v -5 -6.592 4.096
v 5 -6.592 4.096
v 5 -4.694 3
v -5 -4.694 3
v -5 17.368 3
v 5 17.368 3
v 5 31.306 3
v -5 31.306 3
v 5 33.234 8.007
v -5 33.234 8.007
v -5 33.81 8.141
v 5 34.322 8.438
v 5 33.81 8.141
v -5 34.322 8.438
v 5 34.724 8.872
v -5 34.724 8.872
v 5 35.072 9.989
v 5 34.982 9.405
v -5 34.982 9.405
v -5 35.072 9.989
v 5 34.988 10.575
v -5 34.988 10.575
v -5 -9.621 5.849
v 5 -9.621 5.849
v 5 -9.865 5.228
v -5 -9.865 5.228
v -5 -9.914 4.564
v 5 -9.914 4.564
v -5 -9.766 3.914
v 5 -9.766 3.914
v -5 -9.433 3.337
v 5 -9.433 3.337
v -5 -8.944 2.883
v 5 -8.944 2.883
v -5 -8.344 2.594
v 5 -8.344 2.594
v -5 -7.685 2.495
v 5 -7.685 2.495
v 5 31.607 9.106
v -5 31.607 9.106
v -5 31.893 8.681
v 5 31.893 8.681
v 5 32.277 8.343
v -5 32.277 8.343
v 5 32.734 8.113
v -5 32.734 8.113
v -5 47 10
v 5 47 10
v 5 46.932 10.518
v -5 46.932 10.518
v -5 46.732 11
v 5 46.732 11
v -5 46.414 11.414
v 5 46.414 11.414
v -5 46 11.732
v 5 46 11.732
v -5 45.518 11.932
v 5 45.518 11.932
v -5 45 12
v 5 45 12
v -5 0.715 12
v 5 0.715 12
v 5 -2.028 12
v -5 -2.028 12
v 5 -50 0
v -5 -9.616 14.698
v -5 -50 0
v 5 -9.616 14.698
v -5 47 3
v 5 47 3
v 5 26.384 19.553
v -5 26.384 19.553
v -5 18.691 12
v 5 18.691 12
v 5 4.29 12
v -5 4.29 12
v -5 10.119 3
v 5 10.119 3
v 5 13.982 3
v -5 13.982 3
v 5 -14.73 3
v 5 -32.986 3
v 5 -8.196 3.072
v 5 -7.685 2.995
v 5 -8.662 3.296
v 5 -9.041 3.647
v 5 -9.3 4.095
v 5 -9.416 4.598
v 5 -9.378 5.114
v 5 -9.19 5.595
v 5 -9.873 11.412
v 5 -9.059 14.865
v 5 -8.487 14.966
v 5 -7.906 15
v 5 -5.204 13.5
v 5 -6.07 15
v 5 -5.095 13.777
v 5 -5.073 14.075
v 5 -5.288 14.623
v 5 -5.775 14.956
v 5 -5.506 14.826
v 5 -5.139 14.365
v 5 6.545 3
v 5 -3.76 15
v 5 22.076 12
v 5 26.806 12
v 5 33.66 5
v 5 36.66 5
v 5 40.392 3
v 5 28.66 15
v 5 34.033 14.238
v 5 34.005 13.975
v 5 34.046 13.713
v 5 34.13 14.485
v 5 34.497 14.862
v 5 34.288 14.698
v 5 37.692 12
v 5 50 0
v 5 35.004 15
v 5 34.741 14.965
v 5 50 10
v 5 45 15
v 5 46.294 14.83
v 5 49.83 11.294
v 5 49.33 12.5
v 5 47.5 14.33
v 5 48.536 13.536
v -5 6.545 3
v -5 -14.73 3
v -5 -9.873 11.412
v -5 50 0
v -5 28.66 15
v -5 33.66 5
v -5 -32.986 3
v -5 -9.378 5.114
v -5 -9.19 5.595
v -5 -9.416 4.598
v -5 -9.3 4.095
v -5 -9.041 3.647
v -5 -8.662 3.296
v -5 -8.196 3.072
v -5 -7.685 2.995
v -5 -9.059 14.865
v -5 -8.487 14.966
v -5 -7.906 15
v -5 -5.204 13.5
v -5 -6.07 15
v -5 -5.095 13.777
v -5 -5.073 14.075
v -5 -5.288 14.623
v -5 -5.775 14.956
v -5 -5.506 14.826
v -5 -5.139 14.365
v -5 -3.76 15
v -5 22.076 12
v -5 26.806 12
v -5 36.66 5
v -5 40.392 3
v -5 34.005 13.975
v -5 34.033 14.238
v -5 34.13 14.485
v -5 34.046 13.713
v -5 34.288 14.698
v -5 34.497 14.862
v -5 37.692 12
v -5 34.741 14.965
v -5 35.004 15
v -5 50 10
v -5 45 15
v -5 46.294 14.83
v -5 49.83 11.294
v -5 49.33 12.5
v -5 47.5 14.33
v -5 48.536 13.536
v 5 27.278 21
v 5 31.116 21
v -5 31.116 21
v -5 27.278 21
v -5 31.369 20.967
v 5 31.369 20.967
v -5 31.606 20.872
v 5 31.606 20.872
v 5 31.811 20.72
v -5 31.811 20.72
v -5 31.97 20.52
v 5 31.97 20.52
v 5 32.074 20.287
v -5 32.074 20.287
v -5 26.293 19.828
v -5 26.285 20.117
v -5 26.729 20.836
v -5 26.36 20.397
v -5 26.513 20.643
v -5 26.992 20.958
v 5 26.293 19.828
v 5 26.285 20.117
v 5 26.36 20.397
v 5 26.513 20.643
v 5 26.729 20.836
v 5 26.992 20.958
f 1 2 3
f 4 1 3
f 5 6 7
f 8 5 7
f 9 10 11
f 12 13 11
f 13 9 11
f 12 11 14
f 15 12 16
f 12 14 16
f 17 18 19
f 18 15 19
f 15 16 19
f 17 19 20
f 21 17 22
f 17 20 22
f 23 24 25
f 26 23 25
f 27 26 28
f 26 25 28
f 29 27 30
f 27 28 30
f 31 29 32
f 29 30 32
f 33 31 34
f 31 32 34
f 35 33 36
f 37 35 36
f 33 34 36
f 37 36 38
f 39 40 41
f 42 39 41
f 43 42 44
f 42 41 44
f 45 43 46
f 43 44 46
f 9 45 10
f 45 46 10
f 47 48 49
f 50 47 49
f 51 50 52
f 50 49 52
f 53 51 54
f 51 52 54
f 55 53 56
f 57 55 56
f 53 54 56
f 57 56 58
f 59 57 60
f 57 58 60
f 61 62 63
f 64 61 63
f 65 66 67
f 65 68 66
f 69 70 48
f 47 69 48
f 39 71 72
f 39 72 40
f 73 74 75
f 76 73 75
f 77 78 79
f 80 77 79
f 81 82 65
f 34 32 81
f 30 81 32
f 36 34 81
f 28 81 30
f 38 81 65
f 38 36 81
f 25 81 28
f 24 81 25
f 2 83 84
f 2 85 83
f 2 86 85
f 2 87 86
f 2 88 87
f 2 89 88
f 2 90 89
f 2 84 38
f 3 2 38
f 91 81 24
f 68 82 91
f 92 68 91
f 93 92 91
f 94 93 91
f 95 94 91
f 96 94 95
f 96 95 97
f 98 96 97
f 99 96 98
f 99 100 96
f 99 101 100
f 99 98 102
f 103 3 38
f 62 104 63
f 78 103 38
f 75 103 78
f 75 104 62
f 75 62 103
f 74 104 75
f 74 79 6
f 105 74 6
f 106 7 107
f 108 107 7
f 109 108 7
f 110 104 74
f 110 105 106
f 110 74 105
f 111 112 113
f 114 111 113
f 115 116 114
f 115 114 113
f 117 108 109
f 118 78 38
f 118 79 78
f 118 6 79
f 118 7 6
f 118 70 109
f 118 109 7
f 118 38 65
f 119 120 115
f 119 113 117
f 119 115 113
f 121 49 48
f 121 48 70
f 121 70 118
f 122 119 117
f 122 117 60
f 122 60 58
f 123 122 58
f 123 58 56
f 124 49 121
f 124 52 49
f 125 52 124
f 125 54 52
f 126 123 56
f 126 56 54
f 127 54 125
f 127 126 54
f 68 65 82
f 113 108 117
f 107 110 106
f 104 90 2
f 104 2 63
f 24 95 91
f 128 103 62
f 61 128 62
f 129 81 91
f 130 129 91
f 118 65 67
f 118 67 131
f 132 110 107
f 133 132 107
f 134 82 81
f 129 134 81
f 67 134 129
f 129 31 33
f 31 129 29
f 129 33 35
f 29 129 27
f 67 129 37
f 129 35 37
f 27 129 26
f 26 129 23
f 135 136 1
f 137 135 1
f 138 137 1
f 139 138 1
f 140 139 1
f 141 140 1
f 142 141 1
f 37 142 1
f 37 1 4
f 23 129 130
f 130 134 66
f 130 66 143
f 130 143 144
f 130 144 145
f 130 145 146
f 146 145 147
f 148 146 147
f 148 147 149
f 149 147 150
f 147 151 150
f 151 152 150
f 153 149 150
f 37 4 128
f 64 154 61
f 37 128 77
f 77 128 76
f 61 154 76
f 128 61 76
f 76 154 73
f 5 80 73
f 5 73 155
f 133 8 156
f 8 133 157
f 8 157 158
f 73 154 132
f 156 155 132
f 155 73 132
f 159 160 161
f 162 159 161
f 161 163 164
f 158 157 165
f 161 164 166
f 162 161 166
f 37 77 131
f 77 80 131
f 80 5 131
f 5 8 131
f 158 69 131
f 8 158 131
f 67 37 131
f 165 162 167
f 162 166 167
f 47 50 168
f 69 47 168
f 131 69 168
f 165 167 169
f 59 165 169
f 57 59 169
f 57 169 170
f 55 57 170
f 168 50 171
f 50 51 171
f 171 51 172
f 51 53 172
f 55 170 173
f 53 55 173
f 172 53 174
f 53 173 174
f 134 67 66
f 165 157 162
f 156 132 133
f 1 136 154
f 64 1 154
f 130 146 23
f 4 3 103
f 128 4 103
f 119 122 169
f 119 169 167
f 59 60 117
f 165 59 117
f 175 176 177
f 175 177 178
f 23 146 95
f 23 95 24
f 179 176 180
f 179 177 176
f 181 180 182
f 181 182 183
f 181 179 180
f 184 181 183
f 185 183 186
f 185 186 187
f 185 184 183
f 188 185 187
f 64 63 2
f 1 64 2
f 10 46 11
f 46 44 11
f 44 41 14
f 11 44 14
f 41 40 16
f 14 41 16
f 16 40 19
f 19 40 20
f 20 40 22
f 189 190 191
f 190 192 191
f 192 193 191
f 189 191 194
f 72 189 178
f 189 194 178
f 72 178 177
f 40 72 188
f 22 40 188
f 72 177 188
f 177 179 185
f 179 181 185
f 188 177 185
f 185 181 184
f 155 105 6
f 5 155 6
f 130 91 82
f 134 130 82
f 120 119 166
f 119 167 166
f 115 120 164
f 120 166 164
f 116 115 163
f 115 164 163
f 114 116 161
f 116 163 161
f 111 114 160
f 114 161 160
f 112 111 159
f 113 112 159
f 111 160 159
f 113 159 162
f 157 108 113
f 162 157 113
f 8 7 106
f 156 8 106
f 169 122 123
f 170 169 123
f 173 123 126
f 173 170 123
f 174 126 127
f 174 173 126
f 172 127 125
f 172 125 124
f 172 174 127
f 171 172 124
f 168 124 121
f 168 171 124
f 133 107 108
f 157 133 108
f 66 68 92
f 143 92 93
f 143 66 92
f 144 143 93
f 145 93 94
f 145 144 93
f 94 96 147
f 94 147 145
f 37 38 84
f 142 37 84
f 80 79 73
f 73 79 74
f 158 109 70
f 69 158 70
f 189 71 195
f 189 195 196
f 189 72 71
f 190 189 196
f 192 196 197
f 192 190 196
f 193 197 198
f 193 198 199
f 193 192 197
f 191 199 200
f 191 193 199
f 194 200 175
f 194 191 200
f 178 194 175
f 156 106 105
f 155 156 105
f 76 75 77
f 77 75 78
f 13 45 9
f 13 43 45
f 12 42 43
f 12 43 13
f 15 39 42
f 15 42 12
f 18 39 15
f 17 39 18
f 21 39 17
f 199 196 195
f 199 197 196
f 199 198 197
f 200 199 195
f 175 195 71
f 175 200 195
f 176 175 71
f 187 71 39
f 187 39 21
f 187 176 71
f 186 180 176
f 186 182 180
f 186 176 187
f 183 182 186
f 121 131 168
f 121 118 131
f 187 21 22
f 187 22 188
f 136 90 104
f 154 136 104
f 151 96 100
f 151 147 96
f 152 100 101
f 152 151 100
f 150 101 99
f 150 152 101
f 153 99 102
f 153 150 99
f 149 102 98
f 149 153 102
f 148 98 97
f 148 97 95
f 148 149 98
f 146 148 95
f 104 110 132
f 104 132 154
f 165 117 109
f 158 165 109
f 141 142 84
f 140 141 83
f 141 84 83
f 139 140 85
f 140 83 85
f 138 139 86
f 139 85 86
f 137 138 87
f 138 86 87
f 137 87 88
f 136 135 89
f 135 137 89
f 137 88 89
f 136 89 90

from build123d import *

# Parameters (mm, degrees)
F1_DEPTH     = 5
F2_R         = 5
F4_DEPTH     = 25
F6_DEPTH     = 10
F8_DEPTH     = 25
F9_R         = 1
F10_T1_DEPTH = 16.1803398875
F10_T3_DEPTH = 23.4403065089
F11_R        = 1


# Not quite as in the source:
# - a fillet or chamfer that OpenCascade refuses, or shapes differently, is made with other operations: its cross-section is extruded or revolved along the edge and cut away or added
# - ends of sketch curves that miss each other by under 0.0002 mm in the source are joined


with BuildPart() as f1:
    # F0 (on Right) → F1 (new body, symmetric)
    with BuildSketch(Plane.YZ):
        Polygon((-8.7878387082, 15), (-50, 0), (50, 0), (50, 15), align=None)
    extrude(amount=F1_DEPTH, both=True)

    # F2
    f2_edges = [f1.edges().sort_by_distance(p)[0] for p in [
        (0, 50, 15),
        (0, -8.787839, 15),
    ]]
    fillet(f2_edges, radius=F2_R)

    # F3 (on face) → F4 (cut)
    with BuildSketch(Plane.YZ.offset(5)):
        with BuildLine():
            Line((-3.7603476085, 15), (-4.3376978777, 15))
            Line((-4.3376978777, 15), (-9.6211402319, 5.8488094036))
            ThreePointArc((-9.6211402319, 5.8488094036), (-9.6211402319, 3.6128792242), (-7.6847678955, 2.4949141345))
            Line((-7.6847678955, 2.4949141345), (-7.6847678955, 2.9949141345))
            ThreePointArc((-7.6847678955, 2.9949141345), (-9.1871699303, 3.8612227218), (-9.190037249, 5.5954932374))
            Line((-9.190037249, 5.5954932374), (-3.7603476085, 15))
        make_face()
        Polygon((33.6602540378, 15), (28.6602540378, 15), (33.6602540378, 5), (36.6602540378, 5), align=None)
    extrude(amount=-F4_DEPTH, mode=Mode.SUBTRACT)

    # F7 (on face) → F8 (cut)
    with BuildSketch(Plane.YZ.offset(5)):
        Polygon((22.076485224, 12), (17.3679771944, 3), (31.3061520716, 3), (26.8061520716, 12), align=None)
        Polygon((4.2896619261, 12), (10.1192439169, 3), (13.9822219387, 3), (18.6907299683, 12), align=None)
        Polygon((-6.5919574173, 4.095507944), (-4.6944819983, 3), (6.5448904216, 3), (0.7153084307, 12), (-2.0282968009, 12), align=None)
        Polygon((-9.8730549791, 11.4124802622), (-32.9861545411, 3), (-14.7300027231, 3), align=None)
        with BuildLine():
            Line((45, 12), (37.6923459905, 12))
            Line((37.6923459905, 12), (40.3923459905, 3))
            Line((40.3923459905, 3), (47, 3))
            Line((47, 3), (47, 10))
            ThreePointArc((47, 10), (46.4142135624, 11.4142135624), (45, 12))
        make_face()
    extrude(amount=-F8_DEPTH, mode=Mode.SUBTRACT)

    # F9
    f9_edges = [f1.edges().sort_by_distance(p)[0] for p in [
        (0, -4.337698, 15),
        (0, 33.660254, 15),
    ]]
    fillet(f9_edges, radius=F9_R)


with BuildPart() as f6:
    # F5 (on face) → F6 (new body)
    with BuildSketch(Plane.YZ.offset(5)):
        Polygon((25.6602540378, 21), (32.1602540378, 8), (35.7602540378, 8), (31.8602540378, 21), align=None)
    extrude(amount=-F6_DEPTH)

    # F10: fillet of radius 2 on 2 edges, made by hand

    # F10_s2 → F10_t1 (cut)
    with BuildSketch(Plane.YZ.offset(-8.0901699437)):
        with BuildLine():
            ThreePointArc((31.6074676333, 9.105572809), (32.3448597911, 8.2986983833), (33.3963220153, 8))
            Line((33.3963220153, 8), (32.1602540378, 8))
            Line((32.1602540378, 8), (31.6074676333, 9.105572809))
        make_face()
    extrude(amount=F10_T1_DEPTH, mode=Mode.SUBTRACT)

    # F10_s4 → F10_t3 (cut)
    with BuildSketch(Plane.YZ.offset(-11.7201532545)):
        with BuildLine():
            ThreePointArc((33.0721927361, 8), (34.6767785926, 8.8061389407), (34.9878453065, 10.5746957711))
            Line((34.9878453065, 10.5746957711), (35.7602540378, 8))
            Line((35.7602540378, 8), (33.0721927361, 8))
        make_face()
    extrude(amount=F10_T3_DEPTH, mode=Mode.SUBTRACT)

    # F11
    f11_edges = [f6.edges().sort_by_distance(p)[0] for p in [
        (0, 25.660254, 21),
        (0, 31.860254, 21),
    ]]
    fillet(f11_edges, radius=F11_R)


solid = Compound([f1.part, f6.part])
